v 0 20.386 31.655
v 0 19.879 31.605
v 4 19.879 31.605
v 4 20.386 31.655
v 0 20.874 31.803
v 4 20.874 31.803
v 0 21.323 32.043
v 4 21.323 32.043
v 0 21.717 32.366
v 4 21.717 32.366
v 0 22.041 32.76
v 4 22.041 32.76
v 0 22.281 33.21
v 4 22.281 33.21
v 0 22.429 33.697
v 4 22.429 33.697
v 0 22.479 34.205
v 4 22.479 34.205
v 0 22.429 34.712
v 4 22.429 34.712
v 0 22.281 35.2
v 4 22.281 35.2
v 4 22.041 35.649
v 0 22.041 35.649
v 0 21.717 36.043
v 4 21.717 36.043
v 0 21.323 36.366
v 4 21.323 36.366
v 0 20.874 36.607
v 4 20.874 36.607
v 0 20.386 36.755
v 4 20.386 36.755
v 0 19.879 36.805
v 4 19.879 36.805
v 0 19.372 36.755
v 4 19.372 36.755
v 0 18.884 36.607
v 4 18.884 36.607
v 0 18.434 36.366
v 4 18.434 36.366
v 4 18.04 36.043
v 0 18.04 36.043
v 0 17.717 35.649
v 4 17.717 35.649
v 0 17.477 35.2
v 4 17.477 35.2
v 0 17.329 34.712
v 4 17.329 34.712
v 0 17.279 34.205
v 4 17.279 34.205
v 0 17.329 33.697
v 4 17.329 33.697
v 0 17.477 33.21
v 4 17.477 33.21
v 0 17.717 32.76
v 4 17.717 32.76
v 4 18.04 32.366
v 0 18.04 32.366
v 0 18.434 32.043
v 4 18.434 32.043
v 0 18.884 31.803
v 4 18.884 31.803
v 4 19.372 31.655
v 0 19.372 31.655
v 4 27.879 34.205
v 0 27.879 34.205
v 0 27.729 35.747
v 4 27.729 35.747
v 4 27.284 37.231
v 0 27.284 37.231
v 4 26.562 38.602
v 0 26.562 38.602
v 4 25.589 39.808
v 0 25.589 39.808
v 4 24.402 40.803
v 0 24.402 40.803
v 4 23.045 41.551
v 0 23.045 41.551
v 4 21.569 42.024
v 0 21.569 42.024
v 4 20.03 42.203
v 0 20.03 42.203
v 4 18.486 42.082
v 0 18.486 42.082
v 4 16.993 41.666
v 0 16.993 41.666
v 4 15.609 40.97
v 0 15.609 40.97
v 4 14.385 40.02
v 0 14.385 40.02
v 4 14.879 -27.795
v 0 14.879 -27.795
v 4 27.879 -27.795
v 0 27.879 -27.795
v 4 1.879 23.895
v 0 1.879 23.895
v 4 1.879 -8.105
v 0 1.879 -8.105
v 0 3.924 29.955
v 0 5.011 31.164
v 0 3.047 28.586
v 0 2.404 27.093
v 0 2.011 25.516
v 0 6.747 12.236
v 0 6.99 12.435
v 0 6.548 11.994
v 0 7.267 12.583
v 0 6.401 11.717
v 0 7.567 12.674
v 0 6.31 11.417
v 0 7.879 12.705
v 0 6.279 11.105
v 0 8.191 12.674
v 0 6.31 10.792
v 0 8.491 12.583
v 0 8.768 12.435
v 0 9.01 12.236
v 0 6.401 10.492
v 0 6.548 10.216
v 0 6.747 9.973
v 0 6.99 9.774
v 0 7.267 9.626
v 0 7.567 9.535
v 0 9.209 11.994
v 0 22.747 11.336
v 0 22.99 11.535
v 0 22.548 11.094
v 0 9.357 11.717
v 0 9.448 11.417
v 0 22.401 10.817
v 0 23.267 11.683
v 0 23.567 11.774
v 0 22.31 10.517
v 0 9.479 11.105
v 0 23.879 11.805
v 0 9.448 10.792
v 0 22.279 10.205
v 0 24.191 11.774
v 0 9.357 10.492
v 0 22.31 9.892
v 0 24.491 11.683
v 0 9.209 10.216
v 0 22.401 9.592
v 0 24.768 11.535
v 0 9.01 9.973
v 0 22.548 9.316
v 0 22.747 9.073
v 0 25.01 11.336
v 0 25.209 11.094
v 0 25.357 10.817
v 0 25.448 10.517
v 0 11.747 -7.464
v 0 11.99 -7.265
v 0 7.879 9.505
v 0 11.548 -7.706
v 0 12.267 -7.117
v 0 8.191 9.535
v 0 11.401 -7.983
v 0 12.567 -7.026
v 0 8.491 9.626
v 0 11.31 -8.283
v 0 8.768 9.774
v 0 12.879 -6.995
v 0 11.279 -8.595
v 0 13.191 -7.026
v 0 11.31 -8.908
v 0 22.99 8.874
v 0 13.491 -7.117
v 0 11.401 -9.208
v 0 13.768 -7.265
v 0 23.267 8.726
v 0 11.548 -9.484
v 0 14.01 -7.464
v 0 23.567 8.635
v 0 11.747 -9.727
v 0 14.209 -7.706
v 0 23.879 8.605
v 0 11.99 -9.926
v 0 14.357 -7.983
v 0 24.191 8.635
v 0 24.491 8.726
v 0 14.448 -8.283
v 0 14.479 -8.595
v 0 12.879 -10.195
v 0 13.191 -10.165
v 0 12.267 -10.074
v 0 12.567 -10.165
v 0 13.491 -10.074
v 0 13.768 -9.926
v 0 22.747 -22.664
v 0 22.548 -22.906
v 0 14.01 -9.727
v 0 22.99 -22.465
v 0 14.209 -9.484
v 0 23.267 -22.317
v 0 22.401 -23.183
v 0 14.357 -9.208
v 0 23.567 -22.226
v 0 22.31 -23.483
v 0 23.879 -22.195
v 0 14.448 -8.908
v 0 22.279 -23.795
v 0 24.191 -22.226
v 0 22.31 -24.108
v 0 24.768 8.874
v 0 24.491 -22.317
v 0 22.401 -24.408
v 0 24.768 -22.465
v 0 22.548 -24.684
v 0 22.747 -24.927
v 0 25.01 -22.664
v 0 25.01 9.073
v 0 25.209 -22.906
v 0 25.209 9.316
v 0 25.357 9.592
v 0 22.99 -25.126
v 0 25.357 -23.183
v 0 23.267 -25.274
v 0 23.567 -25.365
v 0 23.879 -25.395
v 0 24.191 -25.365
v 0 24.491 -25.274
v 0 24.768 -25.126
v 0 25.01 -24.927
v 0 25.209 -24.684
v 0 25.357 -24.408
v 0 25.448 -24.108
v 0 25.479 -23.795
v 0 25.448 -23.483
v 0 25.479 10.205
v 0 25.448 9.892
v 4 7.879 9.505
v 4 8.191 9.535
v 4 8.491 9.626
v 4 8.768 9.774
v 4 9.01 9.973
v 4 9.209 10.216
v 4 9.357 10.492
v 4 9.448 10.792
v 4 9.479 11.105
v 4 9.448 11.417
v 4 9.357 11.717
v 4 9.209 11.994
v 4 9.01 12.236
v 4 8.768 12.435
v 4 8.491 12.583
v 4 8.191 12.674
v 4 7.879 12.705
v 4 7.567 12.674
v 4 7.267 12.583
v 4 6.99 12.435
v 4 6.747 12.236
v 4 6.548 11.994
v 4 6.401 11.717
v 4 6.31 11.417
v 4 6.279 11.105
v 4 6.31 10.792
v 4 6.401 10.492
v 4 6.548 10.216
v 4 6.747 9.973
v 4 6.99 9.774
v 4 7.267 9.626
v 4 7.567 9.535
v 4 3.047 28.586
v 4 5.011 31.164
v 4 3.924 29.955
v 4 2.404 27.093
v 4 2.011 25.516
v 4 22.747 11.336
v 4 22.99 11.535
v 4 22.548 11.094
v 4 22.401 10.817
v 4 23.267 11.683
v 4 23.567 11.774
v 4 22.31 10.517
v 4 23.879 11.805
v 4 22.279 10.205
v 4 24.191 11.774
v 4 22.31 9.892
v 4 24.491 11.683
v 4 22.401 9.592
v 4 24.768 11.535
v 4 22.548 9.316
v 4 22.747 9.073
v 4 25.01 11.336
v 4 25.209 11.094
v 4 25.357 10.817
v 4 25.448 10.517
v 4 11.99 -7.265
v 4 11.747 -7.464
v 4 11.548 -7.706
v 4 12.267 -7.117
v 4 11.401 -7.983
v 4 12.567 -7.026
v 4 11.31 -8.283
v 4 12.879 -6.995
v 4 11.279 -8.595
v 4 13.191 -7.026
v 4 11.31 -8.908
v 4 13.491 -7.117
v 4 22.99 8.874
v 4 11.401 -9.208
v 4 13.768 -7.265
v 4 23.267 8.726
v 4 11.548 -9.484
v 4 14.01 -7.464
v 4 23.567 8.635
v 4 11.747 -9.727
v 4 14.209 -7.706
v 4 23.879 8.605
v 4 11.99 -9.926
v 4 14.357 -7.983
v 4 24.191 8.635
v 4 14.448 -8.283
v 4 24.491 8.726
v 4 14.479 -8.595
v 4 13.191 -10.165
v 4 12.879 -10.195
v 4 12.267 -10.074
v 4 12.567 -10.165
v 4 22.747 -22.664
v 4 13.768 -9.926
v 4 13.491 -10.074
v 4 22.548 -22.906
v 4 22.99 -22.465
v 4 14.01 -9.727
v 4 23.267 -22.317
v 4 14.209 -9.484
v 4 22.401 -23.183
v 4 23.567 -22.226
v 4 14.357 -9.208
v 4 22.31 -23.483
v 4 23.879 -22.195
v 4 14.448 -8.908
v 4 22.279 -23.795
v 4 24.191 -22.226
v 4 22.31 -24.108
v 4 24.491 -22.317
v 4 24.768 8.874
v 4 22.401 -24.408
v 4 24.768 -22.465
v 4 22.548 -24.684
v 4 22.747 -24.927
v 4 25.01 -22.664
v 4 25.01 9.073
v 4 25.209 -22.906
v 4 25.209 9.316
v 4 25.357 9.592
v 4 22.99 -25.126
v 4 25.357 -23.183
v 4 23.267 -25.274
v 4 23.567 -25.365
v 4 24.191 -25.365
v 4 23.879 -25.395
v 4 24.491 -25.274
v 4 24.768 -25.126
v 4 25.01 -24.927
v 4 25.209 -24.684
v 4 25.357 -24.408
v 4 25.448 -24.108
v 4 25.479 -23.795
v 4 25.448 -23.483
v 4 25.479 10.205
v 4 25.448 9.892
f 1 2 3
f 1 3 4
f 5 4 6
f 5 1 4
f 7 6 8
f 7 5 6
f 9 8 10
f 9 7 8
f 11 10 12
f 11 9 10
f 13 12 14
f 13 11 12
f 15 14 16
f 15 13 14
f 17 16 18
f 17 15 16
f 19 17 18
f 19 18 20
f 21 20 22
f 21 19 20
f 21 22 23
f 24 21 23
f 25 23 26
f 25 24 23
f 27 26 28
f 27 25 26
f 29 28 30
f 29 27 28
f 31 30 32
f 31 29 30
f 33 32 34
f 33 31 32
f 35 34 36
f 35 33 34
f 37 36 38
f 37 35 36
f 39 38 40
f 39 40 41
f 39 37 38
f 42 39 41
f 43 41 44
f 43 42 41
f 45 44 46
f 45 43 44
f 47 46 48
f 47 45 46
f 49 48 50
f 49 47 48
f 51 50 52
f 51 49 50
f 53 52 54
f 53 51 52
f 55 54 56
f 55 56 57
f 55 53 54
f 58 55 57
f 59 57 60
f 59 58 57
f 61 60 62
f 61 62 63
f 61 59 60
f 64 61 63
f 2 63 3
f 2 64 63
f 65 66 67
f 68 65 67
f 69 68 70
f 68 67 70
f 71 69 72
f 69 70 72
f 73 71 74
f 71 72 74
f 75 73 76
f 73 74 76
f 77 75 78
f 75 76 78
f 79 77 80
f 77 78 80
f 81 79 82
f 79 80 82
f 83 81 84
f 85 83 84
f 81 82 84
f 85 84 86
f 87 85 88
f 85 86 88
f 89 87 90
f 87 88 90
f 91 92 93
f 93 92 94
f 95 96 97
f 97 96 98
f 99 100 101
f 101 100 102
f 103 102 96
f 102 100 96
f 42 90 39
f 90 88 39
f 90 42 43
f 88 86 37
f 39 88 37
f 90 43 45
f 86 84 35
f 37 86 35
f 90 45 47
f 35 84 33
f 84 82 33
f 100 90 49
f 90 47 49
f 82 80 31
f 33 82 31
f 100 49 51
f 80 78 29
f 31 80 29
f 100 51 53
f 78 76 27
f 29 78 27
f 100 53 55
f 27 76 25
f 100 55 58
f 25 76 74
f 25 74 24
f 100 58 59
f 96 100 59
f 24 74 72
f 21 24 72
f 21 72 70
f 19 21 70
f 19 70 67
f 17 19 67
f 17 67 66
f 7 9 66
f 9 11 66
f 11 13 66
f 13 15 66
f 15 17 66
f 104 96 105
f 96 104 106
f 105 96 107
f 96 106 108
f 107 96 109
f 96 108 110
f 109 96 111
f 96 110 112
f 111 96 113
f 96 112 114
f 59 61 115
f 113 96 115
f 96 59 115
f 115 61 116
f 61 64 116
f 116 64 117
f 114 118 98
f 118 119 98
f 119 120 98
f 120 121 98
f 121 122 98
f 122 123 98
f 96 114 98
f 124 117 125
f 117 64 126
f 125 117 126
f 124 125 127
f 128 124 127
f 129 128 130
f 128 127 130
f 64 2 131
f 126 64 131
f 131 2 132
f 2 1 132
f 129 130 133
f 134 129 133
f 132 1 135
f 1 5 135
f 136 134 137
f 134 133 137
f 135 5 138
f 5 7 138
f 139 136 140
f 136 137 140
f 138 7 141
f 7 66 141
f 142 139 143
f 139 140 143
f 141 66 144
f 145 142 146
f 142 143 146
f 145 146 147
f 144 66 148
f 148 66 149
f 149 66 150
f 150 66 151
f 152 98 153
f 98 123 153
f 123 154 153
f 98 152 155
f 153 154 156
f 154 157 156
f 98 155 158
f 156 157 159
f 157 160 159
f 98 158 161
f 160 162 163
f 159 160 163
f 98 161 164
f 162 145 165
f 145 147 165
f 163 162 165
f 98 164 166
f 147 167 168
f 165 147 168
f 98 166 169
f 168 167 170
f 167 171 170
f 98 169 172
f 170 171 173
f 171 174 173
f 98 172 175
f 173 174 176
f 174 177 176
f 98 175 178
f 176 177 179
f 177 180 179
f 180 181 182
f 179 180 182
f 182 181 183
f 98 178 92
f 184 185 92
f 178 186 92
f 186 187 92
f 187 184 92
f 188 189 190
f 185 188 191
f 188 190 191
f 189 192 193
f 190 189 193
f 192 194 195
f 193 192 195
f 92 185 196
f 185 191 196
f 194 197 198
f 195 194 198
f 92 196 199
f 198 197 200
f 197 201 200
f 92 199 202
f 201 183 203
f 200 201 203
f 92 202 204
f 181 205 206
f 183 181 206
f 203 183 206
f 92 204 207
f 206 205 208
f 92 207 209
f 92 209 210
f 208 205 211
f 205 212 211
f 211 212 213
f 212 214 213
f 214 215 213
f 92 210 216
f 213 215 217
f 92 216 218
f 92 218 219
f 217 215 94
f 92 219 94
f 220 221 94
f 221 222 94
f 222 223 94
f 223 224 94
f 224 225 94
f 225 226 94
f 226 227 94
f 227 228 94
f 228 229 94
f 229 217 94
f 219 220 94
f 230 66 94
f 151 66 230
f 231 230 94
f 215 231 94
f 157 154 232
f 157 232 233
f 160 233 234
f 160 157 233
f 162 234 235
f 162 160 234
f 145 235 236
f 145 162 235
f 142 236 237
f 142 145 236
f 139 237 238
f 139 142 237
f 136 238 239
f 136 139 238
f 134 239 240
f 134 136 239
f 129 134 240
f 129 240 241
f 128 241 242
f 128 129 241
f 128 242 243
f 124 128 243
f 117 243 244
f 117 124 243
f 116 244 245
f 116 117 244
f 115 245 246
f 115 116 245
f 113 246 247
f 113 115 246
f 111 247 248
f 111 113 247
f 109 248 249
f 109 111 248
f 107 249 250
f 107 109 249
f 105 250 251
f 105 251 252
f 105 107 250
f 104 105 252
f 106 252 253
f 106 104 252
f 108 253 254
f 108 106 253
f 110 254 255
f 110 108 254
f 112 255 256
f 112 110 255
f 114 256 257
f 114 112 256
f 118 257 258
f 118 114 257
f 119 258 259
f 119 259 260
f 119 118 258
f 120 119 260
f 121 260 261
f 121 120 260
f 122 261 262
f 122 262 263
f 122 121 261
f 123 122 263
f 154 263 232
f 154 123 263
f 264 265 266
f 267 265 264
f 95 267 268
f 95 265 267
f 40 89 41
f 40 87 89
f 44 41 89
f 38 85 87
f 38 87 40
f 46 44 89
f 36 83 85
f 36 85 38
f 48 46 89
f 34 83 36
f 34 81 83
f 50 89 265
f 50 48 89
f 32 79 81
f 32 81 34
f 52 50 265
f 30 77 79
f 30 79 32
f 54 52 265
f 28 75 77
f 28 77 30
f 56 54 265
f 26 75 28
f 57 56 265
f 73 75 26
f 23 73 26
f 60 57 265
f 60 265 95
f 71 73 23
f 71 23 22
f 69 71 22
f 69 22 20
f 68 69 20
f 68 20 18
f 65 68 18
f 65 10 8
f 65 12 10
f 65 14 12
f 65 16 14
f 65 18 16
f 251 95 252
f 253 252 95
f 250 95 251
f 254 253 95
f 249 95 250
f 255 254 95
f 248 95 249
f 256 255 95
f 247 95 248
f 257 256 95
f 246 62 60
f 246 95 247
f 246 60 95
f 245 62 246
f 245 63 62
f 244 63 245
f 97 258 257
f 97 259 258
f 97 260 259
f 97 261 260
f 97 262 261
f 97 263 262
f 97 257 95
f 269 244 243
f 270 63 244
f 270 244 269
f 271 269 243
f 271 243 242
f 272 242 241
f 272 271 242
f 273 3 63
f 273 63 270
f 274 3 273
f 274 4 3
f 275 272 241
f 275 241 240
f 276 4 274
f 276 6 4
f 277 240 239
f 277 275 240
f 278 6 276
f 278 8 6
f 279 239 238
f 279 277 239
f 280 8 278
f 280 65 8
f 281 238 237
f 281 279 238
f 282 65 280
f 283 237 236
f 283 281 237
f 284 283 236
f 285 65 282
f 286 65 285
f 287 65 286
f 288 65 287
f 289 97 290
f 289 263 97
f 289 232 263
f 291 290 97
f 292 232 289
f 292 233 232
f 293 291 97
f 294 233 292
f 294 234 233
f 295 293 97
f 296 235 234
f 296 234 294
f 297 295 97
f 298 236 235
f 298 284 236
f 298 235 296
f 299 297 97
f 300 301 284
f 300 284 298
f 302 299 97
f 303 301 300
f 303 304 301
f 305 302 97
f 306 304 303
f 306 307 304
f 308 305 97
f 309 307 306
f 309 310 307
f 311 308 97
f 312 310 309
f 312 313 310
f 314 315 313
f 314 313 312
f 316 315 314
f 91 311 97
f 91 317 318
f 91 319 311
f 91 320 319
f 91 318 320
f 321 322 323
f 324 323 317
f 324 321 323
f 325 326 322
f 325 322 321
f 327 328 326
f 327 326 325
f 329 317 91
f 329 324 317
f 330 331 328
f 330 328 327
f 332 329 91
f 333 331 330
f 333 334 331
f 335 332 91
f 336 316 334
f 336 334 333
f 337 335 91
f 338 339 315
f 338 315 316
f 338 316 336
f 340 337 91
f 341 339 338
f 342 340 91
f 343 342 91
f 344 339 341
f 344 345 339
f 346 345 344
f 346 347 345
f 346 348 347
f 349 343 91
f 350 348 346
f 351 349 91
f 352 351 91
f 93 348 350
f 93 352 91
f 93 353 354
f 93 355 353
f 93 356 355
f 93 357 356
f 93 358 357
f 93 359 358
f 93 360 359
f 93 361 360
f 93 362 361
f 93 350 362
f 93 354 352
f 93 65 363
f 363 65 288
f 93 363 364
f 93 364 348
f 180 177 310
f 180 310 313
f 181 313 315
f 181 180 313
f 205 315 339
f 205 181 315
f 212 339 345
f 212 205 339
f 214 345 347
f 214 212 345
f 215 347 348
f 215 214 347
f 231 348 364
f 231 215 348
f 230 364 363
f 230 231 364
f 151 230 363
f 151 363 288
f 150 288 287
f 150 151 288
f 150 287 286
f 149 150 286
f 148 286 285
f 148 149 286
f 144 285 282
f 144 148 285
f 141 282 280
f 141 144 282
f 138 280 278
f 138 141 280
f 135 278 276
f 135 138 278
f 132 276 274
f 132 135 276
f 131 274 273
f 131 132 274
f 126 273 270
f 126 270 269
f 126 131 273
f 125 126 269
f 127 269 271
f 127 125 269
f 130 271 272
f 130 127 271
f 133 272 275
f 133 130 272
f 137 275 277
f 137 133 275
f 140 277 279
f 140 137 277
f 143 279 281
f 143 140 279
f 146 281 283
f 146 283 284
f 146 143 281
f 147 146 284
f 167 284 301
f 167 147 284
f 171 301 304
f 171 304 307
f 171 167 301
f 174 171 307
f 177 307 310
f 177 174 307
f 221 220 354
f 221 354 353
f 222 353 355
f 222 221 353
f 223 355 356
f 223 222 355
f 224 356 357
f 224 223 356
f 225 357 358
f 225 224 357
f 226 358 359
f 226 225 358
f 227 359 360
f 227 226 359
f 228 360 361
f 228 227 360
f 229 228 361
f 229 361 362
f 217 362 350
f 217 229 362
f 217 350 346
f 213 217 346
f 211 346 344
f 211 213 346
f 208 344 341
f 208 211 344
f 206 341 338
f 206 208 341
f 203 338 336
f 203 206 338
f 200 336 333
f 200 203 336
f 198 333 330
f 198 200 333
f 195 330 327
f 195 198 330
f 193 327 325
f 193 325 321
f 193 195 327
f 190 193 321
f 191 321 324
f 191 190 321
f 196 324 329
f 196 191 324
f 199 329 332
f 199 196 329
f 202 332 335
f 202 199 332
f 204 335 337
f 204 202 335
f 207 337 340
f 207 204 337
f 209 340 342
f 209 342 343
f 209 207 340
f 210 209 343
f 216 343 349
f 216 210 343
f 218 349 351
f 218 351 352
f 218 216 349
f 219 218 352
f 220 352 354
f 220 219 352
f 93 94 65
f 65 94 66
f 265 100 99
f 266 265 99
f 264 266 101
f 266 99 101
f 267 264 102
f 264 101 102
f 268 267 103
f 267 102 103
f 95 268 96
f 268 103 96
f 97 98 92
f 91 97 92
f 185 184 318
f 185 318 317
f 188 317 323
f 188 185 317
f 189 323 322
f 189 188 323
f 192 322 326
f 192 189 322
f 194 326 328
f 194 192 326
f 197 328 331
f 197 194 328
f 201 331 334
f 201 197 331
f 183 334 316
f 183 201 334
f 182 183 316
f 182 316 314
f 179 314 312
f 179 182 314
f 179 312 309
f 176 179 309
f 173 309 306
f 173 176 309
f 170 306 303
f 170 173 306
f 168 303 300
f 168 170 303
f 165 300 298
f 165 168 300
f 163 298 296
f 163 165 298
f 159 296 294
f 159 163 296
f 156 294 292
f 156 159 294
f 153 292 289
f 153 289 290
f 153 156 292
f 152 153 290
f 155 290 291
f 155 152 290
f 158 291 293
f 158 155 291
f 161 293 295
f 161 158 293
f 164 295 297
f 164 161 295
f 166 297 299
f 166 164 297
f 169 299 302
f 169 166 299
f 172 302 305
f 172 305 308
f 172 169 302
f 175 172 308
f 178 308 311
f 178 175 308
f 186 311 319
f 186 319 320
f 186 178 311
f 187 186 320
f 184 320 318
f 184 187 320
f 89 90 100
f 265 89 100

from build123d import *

# Parameters (mm, degrees)
SKETCH_1_R      = 1.6
SKETCH_1_R_2    = 2.6
EXTRUDE_1_DEPTH = 4


with BuildPart() as part:
    # 草图1 → 凸台-拉伸1 (new body)
    with BuildSketch(Plane(origin=(0, 0, 0), x_dir=(0, 0, -1), z_dir=(1, 0, 0))):
        with BuildLine():
            Line((8.104883027, 1.878840053), (27.795402052, 14.878840053))
            Line((27.795402052, 14.878840053), (27.795402052, 27.878840053))
            Line((27.795402052, 27.878840053), (-34.204597948, 27.878840053))
            ThreePointArc((-34.204597948, 27.878840053), (-41.551421317, 23.044939607), (-40.019791495, 14.384886649))
            Line((-40.019791495, 14.384886649), (-31.164108907, 5.011398298))
            ThreePointArc((-31.164108907, 5.011398298), (-27.852741415, 2.695310842), (-23.895116973, 1.878840053))
            Line((-23.895116973, 1.878840053), (8.104883027, 1.878840053))
        make_face()
        with Locations((23.795402052, 23.878840053)):
            Circle(SKETCH_1_R, mode=Mode.SUBTRACT)
        with Locations((-10.204597948, 23.878840053)):
            Circle(SKETCH_1_R, mode=Mode.SUBTRACT)
        with Locations((8.595402052, 12.878840053)):
            Circle(SKETCH_1_R, mode=Mode.SUBTRACT)
        with Locations((-11.104597948, 7.878840053)):
            Circle(SKETCH_1_R, mode=Mode.SUBTRACT)
        with Locations((-34.204597948, 19.878840053)):
            Circle(SKETCH_1_R_2, mode=Mode.SUBTRACT)
    extrude(amount=EXTRUDE_1_DEPTH)


solid = part.part
